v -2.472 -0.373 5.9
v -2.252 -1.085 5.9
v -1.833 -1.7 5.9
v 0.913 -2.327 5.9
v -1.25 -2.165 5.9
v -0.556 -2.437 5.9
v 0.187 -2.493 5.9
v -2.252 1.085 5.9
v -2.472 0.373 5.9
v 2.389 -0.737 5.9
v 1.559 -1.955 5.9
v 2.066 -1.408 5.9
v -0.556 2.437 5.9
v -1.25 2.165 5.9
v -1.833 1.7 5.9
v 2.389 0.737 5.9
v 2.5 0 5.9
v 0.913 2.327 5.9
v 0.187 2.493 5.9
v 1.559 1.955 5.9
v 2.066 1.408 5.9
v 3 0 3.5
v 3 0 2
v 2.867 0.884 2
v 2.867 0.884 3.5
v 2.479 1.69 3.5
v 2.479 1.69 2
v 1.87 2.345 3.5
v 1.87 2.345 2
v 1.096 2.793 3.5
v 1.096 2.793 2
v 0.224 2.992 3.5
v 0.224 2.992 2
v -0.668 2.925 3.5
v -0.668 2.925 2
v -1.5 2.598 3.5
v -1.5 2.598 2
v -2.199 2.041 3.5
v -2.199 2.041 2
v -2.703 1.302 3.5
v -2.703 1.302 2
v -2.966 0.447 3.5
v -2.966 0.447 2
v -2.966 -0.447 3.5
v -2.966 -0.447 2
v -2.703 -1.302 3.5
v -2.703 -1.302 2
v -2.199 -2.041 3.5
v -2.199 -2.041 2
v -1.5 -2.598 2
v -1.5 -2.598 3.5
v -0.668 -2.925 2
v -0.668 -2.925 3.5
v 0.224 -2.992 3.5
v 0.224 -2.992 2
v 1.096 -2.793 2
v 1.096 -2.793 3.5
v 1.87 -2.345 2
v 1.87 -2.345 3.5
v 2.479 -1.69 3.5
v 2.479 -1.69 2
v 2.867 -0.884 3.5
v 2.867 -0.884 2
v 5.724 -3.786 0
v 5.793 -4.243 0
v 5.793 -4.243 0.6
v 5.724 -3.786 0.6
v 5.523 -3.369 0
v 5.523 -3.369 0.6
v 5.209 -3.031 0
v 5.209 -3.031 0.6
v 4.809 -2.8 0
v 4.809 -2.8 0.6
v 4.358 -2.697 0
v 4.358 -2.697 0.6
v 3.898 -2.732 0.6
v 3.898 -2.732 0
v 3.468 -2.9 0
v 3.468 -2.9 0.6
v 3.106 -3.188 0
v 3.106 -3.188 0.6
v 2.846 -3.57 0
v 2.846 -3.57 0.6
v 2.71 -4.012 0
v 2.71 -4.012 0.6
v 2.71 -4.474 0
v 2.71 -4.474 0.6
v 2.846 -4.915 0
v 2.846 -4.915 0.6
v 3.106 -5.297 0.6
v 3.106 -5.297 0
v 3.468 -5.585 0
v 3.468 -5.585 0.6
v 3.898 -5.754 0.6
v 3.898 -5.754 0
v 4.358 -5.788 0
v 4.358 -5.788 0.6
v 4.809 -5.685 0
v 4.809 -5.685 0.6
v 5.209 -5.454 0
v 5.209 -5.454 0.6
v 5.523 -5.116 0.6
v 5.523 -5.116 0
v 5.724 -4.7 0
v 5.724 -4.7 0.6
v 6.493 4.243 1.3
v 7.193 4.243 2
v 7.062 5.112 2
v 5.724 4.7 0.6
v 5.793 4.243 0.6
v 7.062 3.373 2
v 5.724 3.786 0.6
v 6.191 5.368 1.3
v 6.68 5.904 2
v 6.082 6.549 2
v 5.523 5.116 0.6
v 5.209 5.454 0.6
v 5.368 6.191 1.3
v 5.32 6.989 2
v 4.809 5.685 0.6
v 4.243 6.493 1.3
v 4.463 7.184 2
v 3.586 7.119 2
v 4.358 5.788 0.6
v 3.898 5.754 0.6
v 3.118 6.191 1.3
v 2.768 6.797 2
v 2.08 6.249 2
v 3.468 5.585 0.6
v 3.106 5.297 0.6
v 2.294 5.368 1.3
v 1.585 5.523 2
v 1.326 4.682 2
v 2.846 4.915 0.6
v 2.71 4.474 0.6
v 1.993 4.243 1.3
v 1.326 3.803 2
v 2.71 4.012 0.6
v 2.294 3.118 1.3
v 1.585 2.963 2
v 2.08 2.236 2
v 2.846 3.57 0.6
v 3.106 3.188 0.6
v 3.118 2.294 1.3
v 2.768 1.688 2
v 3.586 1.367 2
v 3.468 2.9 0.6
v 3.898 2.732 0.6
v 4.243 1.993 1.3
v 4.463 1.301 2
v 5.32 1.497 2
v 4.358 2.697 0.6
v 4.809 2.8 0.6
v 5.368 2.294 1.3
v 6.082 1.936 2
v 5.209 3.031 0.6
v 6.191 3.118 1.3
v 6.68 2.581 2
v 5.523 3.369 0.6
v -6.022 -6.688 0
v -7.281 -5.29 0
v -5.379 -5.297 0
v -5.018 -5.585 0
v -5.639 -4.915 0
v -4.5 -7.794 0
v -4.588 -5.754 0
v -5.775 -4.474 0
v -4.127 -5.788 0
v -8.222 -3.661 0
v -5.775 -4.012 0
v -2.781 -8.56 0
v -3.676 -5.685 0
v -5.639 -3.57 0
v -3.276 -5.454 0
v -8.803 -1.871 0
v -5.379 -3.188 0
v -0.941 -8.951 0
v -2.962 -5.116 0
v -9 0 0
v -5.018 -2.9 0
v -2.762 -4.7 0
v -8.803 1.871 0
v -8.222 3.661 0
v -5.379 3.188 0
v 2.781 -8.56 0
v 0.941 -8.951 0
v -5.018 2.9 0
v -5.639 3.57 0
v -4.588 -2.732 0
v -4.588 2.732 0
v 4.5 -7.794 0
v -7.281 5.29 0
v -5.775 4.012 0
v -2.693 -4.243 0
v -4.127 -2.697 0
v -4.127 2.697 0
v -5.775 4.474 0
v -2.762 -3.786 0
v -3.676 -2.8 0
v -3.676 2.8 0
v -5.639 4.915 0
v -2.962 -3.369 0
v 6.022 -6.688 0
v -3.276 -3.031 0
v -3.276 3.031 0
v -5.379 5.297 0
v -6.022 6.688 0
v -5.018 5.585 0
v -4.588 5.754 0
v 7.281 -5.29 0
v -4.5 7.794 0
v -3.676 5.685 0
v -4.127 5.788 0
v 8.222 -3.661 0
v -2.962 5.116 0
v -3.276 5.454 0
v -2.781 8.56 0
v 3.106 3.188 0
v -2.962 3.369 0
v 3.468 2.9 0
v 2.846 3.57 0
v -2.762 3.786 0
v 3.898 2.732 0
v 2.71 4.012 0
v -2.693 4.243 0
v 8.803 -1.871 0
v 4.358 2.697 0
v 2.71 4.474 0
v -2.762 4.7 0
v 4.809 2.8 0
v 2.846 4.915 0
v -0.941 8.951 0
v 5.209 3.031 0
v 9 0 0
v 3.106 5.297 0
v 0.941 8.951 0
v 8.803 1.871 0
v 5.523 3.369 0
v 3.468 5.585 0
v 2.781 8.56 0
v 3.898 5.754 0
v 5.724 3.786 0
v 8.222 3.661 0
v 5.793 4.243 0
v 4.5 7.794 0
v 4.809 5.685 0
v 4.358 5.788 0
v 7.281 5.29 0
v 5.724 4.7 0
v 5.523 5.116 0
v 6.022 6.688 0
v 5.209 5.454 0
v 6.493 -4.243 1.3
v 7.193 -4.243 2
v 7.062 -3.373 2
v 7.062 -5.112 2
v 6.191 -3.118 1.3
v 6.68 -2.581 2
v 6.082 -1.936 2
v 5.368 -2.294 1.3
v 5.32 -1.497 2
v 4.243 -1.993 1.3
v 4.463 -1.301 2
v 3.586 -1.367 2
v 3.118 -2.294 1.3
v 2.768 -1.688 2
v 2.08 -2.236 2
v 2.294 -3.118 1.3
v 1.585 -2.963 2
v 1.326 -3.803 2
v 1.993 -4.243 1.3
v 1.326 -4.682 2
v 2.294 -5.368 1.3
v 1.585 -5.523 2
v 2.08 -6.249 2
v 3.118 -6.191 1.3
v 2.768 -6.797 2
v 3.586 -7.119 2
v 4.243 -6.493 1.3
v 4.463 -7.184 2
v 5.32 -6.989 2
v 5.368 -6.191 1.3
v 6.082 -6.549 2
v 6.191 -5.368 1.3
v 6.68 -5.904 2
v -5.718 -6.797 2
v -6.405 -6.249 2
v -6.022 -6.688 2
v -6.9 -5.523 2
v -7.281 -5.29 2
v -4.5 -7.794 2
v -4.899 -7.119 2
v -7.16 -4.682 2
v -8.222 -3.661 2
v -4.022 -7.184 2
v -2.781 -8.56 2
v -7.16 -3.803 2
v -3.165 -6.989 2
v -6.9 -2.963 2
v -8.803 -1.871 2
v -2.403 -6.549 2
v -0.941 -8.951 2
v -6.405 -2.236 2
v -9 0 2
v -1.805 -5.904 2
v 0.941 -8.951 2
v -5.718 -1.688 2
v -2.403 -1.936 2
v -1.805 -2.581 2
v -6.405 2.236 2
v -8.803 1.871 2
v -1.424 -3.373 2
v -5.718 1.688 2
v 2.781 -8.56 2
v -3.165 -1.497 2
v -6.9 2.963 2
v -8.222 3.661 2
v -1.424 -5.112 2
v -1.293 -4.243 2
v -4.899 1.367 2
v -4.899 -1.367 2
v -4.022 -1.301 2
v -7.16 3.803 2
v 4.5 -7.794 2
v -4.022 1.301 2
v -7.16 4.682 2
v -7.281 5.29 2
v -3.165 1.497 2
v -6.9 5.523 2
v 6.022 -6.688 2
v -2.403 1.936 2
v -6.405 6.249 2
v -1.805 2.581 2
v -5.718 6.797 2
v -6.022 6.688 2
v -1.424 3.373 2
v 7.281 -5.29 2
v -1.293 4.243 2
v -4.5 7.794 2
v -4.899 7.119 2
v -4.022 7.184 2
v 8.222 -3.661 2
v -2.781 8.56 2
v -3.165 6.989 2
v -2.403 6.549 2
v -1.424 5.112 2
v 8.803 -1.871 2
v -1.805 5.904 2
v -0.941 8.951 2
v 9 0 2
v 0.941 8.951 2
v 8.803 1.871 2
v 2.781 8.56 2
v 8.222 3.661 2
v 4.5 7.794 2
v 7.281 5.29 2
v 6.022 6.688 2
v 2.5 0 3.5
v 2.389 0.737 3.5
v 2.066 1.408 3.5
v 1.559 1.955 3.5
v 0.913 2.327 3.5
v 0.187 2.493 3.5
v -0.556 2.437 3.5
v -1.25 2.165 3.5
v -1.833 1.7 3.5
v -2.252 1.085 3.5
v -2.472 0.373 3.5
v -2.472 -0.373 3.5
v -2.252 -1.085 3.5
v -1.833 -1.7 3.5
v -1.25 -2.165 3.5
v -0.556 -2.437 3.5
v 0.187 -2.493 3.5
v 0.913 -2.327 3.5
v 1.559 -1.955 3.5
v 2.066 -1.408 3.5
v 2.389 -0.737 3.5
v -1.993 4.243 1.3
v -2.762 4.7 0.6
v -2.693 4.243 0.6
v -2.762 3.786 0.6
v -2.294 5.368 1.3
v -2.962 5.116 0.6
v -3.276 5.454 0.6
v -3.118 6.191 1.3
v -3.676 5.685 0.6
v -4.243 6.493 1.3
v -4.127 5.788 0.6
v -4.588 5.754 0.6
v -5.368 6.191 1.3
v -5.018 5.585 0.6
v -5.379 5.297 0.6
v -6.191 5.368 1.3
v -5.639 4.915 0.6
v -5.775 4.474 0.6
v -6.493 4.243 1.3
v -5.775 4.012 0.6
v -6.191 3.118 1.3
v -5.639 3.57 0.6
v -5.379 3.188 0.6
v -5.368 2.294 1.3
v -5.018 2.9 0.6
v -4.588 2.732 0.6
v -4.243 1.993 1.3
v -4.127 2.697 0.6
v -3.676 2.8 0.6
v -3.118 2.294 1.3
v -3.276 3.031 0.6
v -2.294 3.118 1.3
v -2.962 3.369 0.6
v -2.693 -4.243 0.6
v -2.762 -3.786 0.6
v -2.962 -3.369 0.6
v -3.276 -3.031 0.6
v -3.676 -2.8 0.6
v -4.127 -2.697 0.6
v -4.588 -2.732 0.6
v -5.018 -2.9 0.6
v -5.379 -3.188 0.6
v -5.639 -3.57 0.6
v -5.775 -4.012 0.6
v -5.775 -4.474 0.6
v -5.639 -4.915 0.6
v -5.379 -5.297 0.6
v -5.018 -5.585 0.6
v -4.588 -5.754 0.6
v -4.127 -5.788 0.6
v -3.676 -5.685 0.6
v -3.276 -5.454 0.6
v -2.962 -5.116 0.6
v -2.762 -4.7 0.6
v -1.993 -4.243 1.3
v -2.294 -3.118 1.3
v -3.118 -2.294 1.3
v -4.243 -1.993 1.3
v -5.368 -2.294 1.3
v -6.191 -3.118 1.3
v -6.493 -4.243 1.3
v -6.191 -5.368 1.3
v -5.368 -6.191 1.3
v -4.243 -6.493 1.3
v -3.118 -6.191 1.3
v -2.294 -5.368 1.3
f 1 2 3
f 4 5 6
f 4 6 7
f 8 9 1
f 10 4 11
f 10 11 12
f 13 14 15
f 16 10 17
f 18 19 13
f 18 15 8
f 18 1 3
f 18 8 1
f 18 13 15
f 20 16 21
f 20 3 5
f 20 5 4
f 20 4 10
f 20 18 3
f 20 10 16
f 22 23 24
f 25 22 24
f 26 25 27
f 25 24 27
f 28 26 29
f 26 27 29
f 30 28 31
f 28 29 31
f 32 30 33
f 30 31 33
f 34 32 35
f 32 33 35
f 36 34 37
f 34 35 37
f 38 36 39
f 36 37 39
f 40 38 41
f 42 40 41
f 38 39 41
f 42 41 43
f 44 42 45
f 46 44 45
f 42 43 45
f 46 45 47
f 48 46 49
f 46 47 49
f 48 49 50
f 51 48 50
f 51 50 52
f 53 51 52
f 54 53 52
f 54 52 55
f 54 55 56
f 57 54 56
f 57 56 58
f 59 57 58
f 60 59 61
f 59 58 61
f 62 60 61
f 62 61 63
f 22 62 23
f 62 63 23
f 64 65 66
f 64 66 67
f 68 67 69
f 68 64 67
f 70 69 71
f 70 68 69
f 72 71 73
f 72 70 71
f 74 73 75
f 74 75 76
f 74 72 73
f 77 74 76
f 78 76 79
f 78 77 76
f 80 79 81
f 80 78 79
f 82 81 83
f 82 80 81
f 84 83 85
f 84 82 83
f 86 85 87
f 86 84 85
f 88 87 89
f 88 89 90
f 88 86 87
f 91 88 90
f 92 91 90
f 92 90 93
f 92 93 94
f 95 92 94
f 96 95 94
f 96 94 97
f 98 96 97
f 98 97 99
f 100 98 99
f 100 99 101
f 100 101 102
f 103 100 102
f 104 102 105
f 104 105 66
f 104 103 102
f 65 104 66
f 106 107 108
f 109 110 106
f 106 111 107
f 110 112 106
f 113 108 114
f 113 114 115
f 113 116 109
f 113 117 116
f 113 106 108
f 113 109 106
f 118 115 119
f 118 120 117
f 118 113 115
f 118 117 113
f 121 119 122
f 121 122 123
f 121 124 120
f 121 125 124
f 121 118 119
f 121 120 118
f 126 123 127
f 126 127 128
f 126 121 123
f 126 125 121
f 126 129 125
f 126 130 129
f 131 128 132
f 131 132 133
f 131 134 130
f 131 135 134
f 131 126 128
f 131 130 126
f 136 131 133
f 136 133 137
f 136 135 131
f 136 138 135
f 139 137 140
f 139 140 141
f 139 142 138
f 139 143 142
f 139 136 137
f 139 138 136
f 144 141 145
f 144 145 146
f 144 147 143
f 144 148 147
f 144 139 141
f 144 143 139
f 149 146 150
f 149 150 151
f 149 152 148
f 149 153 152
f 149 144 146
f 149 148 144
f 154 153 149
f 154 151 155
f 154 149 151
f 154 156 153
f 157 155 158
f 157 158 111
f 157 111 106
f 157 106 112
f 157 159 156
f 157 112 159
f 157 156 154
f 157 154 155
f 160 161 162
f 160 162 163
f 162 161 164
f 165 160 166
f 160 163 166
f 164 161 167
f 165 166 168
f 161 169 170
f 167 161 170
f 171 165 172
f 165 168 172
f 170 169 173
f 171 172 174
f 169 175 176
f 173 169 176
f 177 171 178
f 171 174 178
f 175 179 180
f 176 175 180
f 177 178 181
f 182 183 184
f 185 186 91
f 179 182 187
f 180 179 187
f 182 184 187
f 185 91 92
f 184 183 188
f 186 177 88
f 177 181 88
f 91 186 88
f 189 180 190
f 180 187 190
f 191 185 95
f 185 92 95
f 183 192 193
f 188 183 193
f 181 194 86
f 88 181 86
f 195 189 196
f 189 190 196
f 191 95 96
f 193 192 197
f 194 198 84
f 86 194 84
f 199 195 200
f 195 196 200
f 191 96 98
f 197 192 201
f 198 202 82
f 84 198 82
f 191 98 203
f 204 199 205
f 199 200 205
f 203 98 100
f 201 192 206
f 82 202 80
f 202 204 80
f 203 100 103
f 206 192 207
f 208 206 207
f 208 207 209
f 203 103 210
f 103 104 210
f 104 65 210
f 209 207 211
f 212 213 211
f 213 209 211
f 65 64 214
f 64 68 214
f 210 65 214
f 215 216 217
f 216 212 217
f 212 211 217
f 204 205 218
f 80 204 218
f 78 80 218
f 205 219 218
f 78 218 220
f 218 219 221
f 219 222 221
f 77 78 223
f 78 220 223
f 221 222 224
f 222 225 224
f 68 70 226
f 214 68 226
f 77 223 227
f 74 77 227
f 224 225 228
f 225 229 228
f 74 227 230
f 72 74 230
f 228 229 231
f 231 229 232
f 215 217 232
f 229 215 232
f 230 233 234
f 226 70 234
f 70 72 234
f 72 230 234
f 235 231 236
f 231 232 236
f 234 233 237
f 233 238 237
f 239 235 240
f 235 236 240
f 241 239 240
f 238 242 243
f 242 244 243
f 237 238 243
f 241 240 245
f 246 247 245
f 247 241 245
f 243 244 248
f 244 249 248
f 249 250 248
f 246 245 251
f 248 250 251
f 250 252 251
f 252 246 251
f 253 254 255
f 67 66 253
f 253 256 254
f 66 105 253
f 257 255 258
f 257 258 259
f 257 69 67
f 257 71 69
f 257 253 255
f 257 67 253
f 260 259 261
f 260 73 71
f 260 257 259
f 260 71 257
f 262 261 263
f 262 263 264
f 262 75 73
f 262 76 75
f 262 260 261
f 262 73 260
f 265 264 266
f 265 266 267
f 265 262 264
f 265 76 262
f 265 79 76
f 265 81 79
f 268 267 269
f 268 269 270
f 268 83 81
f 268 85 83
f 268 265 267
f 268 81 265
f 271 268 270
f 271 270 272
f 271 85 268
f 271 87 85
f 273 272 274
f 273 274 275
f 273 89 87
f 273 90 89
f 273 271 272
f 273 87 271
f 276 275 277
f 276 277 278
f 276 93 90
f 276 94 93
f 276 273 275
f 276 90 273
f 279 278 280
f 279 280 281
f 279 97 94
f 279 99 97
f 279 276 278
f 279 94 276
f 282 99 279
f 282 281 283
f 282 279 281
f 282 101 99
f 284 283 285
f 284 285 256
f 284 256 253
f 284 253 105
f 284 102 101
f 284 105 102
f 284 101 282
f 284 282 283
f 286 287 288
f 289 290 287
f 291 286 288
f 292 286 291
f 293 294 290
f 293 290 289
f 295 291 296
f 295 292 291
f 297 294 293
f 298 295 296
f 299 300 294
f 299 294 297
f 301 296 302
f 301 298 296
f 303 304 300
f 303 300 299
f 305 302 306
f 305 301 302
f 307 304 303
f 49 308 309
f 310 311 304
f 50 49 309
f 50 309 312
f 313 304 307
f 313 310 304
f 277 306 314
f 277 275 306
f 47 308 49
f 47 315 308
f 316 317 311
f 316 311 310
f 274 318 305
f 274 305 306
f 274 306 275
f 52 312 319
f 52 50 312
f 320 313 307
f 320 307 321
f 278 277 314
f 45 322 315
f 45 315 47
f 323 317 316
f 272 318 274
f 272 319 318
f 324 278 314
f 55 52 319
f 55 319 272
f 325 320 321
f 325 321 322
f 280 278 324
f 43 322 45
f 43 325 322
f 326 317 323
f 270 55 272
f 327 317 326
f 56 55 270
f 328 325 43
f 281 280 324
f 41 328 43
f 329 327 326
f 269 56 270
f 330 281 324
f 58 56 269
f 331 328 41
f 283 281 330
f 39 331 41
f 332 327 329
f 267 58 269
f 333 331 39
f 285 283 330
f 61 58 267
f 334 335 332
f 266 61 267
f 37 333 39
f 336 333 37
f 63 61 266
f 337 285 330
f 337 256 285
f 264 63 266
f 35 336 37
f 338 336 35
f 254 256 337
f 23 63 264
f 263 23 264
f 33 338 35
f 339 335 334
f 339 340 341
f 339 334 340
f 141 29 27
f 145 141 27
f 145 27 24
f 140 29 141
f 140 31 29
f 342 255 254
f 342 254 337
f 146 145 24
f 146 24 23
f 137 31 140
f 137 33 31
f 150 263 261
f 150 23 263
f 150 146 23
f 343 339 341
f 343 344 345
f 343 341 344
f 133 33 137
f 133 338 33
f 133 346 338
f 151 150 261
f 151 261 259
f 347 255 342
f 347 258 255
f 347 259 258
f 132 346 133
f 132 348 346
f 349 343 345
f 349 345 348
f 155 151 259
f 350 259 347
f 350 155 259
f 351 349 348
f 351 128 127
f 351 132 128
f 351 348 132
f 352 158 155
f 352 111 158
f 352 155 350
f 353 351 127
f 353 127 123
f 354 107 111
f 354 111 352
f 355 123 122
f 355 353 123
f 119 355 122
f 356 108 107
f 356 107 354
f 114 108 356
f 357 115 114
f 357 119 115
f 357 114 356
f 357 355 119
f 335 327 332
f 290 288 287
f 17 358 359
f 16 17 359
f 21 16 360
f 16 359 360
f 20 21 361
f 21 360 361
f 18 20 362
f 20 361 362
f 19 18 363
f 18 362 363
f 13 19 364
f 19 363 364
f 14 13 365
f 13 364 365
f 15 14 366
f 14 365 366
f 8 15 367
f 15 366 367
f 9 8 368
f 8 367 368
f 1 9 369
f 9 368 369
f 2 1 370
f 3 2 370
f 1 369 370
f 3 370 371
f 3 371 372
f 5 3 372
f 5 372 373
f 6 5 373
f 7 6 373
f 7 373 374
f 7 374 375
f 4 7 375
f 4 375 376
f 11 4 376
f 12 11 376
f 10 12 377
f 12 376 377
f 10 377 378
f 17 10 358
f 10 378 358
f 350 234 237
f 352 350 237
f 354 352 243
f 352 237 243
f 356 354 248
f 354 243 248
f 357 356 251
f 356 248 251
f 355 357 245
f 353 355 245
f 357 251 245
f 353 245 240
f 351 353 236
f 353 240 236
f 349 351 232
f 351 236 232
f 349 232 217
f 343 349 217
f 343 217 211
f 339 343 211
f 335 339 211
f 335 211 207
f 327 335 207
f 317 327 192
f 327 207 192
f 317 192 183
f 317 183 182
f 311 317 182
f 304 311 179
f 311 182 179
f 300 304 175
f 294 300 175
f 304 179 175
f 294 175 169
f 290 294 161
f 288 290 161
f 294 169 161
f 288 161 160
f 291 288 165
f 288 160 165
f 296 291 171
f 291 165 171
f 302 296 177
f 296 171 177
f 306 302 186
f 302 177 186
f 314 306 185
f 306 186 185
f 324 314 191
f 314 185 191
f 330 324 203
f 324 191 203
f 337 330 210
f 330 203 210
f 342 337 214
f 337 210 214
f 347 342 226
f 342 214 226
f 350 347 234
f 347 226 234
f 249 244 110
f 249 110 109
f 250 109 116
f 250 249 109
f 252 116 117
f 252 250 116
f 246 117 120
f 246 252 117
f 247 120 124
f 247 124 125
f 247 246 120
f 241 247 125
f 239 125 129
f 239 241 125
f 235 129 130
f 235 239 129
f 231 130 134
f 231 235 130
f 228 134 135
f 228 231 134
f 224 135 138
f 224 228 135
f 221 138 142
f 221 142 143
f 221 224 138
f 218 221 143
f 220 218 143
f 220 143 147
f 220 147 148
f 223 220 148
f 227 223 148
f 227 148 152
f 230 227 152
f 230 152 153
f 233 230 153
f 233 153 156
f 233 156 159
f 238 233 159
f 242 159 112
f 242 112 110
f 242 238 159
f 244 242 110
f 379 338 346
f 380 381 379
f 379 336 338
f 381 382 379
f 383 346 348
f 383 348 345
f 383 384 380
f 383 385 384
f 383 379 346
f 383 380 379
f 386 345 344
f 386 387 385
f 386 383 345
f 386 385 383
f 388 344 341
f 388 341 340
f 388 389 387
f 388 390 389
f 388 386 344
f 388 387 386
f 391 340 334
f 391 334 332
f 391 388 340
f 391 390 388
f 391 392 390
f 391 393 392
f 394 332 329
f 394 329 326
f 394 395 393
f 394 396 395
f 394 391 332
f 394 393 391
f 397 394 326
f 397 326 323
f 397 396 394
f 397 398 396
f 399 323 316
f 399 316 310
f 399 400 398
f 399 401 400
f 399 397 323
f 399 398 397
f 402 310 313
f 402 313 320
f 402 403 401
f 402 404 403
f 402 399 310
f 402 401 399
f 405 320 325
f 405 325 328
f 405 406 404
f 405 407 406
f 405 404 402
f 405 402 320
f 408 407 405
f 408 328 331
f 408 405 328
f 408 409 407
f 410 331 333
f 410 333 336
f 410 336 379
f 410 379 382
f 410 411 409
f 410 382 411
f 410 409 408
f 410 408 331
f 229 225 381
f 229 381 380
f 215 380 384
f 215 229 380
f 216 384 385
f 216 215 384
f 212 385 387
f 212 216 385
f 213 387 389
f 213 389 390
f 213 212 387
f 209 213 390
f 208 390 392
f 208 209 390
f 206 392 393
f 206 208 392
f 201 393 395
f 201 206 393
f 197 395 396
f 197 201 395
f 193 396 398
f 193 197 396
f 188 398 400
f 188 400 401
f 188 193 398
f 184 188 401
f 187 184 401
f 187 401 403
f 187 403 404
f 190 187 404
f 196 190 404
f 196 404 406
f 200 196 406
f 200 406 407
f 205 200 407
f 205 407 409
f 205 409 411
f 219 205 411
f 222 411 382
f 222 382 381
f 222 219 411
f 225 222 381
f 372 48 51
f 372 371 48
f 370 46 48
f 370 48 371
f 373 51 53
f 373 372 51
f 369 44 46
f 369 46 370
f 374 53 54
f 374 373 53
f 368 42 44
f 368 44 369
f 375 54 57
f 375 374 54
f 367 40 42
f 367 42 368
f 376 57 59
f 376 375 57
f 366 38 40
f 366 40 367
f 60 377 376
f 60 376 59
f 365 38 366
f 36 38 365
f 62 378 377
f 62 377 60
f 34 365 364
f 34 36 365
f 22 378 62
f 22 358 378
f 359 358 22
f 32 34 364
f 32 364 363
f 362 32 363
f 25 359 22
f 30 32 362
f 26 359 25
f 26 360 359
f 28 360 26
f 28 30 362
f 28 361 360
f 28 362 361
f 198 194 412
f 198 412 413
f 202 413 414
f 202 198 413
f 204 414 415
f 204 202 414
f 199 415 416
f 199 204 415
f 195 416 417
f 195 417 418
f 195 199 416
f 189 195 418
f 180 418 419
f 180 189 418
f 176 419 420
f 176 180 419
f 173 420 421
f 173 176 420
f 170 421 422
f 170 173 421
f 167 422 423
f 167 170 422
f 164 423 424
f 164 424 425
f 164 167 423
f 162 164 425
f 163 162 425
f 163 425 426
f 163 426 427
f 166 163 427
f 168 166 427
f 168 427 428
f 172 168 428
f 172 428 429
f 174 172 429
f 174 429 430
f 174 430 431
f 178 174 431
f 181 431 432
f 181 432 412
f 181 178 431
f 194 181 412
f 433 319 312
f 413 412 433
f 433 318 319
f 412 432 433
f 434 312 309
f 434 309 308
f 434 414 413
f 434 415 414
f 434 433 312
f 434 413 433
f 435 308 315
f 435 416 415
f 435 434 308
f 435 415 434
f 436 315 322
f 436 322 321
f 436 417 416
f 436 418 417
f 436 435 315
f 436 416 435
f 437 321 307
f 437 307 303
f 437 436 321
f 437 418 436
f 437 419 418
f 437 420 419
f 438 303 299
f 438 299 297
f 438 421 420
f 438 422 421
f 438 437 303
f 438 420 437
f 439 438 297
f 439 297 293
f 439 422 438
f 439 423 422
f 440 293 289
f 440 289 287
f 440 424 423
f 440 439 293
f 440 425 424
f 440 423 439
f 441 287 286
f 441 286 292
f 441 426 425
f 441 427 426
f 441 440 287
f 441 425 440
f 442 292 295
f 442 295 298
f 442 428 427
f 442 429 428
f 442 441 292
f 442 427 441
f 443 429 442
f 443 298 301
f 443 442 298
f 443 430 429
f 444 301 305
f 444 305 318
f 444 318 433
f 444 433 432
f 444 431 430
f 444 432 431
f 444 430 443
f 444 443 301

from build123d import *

# Parameters (mm, degrees)
SKETCH1_R           = 9
SKETCH1_R_2         = 1.55
BOSS_EXTRUDE1_DEPTH = 2
SKETCH2_R           = 3
BOSS_EXTRUDE2_DEPTH = 1.5
SKETCH3_R           = 2.5
BOSS_EXTRUDE3_DEPTH = 2.4
CHAMFER1_SIZE       = 1.4


with BuildPart() as part:
    # Sketch1 → Boss-Extrude1 (new body)
    with BuildSketch(Plane(origin=(0, 0, 0), x_dir=(0, 1, 0), z_dir=(0, 0, 1))):
        Circle(SKETCH1_R)
        with Locations((-4.242640687, 4.242640687)):
            Circle(SKETCH1_R_2, mode=Mode.SUBTRACT)
        with Locations((4.242640687, 4.242640687)):
            Circle(SKETCH1_R_2, mode=Mode.SUBTRACT)
        with Locations((4.242640687, -4.242640687)):
            Circle(SKETCH1_R_2, mode=Mode.SUBTRACT)
        with Locations((-4.242640687, -4.242640687)):
            Circle(SKETCH1_R_2, mode=Mode.SUBTRACT)
    extrude(amount=BOSS_EXTRUDE1_DEPTH)

    # Sketch2 → Boss-Extrude2 (add)
    with BuildSketch(Plane.XY.offset(2)):
        Circle(SKETCH2_R)
    extrude(amount=BOSS_EXTRUDE2_DEPTH)

    # Sketch3 → Boss-Extrude3 (add)
    with BuildSketch(Plane.XY.offset(3.5)):
        Circle(SKETCH3_R)
    extrude(amount=BOSS_EXTRUDE3_DEPTH)

    # Chamfer1
    chamfer1_edges = [part.edges().sort_by_distance(p)[0] for p in [
        (-4.242640687, 2.692640687, 2),
        (-4.242640687, -5.792640687, 2),
        (4.242640687, -5.792640687, 2),
        (4.242640687, 2.692640687, 2),
    ]]
    chamfer(chamfer1_edges, length=CHAMFER1_SIZE)


solid = part.part
